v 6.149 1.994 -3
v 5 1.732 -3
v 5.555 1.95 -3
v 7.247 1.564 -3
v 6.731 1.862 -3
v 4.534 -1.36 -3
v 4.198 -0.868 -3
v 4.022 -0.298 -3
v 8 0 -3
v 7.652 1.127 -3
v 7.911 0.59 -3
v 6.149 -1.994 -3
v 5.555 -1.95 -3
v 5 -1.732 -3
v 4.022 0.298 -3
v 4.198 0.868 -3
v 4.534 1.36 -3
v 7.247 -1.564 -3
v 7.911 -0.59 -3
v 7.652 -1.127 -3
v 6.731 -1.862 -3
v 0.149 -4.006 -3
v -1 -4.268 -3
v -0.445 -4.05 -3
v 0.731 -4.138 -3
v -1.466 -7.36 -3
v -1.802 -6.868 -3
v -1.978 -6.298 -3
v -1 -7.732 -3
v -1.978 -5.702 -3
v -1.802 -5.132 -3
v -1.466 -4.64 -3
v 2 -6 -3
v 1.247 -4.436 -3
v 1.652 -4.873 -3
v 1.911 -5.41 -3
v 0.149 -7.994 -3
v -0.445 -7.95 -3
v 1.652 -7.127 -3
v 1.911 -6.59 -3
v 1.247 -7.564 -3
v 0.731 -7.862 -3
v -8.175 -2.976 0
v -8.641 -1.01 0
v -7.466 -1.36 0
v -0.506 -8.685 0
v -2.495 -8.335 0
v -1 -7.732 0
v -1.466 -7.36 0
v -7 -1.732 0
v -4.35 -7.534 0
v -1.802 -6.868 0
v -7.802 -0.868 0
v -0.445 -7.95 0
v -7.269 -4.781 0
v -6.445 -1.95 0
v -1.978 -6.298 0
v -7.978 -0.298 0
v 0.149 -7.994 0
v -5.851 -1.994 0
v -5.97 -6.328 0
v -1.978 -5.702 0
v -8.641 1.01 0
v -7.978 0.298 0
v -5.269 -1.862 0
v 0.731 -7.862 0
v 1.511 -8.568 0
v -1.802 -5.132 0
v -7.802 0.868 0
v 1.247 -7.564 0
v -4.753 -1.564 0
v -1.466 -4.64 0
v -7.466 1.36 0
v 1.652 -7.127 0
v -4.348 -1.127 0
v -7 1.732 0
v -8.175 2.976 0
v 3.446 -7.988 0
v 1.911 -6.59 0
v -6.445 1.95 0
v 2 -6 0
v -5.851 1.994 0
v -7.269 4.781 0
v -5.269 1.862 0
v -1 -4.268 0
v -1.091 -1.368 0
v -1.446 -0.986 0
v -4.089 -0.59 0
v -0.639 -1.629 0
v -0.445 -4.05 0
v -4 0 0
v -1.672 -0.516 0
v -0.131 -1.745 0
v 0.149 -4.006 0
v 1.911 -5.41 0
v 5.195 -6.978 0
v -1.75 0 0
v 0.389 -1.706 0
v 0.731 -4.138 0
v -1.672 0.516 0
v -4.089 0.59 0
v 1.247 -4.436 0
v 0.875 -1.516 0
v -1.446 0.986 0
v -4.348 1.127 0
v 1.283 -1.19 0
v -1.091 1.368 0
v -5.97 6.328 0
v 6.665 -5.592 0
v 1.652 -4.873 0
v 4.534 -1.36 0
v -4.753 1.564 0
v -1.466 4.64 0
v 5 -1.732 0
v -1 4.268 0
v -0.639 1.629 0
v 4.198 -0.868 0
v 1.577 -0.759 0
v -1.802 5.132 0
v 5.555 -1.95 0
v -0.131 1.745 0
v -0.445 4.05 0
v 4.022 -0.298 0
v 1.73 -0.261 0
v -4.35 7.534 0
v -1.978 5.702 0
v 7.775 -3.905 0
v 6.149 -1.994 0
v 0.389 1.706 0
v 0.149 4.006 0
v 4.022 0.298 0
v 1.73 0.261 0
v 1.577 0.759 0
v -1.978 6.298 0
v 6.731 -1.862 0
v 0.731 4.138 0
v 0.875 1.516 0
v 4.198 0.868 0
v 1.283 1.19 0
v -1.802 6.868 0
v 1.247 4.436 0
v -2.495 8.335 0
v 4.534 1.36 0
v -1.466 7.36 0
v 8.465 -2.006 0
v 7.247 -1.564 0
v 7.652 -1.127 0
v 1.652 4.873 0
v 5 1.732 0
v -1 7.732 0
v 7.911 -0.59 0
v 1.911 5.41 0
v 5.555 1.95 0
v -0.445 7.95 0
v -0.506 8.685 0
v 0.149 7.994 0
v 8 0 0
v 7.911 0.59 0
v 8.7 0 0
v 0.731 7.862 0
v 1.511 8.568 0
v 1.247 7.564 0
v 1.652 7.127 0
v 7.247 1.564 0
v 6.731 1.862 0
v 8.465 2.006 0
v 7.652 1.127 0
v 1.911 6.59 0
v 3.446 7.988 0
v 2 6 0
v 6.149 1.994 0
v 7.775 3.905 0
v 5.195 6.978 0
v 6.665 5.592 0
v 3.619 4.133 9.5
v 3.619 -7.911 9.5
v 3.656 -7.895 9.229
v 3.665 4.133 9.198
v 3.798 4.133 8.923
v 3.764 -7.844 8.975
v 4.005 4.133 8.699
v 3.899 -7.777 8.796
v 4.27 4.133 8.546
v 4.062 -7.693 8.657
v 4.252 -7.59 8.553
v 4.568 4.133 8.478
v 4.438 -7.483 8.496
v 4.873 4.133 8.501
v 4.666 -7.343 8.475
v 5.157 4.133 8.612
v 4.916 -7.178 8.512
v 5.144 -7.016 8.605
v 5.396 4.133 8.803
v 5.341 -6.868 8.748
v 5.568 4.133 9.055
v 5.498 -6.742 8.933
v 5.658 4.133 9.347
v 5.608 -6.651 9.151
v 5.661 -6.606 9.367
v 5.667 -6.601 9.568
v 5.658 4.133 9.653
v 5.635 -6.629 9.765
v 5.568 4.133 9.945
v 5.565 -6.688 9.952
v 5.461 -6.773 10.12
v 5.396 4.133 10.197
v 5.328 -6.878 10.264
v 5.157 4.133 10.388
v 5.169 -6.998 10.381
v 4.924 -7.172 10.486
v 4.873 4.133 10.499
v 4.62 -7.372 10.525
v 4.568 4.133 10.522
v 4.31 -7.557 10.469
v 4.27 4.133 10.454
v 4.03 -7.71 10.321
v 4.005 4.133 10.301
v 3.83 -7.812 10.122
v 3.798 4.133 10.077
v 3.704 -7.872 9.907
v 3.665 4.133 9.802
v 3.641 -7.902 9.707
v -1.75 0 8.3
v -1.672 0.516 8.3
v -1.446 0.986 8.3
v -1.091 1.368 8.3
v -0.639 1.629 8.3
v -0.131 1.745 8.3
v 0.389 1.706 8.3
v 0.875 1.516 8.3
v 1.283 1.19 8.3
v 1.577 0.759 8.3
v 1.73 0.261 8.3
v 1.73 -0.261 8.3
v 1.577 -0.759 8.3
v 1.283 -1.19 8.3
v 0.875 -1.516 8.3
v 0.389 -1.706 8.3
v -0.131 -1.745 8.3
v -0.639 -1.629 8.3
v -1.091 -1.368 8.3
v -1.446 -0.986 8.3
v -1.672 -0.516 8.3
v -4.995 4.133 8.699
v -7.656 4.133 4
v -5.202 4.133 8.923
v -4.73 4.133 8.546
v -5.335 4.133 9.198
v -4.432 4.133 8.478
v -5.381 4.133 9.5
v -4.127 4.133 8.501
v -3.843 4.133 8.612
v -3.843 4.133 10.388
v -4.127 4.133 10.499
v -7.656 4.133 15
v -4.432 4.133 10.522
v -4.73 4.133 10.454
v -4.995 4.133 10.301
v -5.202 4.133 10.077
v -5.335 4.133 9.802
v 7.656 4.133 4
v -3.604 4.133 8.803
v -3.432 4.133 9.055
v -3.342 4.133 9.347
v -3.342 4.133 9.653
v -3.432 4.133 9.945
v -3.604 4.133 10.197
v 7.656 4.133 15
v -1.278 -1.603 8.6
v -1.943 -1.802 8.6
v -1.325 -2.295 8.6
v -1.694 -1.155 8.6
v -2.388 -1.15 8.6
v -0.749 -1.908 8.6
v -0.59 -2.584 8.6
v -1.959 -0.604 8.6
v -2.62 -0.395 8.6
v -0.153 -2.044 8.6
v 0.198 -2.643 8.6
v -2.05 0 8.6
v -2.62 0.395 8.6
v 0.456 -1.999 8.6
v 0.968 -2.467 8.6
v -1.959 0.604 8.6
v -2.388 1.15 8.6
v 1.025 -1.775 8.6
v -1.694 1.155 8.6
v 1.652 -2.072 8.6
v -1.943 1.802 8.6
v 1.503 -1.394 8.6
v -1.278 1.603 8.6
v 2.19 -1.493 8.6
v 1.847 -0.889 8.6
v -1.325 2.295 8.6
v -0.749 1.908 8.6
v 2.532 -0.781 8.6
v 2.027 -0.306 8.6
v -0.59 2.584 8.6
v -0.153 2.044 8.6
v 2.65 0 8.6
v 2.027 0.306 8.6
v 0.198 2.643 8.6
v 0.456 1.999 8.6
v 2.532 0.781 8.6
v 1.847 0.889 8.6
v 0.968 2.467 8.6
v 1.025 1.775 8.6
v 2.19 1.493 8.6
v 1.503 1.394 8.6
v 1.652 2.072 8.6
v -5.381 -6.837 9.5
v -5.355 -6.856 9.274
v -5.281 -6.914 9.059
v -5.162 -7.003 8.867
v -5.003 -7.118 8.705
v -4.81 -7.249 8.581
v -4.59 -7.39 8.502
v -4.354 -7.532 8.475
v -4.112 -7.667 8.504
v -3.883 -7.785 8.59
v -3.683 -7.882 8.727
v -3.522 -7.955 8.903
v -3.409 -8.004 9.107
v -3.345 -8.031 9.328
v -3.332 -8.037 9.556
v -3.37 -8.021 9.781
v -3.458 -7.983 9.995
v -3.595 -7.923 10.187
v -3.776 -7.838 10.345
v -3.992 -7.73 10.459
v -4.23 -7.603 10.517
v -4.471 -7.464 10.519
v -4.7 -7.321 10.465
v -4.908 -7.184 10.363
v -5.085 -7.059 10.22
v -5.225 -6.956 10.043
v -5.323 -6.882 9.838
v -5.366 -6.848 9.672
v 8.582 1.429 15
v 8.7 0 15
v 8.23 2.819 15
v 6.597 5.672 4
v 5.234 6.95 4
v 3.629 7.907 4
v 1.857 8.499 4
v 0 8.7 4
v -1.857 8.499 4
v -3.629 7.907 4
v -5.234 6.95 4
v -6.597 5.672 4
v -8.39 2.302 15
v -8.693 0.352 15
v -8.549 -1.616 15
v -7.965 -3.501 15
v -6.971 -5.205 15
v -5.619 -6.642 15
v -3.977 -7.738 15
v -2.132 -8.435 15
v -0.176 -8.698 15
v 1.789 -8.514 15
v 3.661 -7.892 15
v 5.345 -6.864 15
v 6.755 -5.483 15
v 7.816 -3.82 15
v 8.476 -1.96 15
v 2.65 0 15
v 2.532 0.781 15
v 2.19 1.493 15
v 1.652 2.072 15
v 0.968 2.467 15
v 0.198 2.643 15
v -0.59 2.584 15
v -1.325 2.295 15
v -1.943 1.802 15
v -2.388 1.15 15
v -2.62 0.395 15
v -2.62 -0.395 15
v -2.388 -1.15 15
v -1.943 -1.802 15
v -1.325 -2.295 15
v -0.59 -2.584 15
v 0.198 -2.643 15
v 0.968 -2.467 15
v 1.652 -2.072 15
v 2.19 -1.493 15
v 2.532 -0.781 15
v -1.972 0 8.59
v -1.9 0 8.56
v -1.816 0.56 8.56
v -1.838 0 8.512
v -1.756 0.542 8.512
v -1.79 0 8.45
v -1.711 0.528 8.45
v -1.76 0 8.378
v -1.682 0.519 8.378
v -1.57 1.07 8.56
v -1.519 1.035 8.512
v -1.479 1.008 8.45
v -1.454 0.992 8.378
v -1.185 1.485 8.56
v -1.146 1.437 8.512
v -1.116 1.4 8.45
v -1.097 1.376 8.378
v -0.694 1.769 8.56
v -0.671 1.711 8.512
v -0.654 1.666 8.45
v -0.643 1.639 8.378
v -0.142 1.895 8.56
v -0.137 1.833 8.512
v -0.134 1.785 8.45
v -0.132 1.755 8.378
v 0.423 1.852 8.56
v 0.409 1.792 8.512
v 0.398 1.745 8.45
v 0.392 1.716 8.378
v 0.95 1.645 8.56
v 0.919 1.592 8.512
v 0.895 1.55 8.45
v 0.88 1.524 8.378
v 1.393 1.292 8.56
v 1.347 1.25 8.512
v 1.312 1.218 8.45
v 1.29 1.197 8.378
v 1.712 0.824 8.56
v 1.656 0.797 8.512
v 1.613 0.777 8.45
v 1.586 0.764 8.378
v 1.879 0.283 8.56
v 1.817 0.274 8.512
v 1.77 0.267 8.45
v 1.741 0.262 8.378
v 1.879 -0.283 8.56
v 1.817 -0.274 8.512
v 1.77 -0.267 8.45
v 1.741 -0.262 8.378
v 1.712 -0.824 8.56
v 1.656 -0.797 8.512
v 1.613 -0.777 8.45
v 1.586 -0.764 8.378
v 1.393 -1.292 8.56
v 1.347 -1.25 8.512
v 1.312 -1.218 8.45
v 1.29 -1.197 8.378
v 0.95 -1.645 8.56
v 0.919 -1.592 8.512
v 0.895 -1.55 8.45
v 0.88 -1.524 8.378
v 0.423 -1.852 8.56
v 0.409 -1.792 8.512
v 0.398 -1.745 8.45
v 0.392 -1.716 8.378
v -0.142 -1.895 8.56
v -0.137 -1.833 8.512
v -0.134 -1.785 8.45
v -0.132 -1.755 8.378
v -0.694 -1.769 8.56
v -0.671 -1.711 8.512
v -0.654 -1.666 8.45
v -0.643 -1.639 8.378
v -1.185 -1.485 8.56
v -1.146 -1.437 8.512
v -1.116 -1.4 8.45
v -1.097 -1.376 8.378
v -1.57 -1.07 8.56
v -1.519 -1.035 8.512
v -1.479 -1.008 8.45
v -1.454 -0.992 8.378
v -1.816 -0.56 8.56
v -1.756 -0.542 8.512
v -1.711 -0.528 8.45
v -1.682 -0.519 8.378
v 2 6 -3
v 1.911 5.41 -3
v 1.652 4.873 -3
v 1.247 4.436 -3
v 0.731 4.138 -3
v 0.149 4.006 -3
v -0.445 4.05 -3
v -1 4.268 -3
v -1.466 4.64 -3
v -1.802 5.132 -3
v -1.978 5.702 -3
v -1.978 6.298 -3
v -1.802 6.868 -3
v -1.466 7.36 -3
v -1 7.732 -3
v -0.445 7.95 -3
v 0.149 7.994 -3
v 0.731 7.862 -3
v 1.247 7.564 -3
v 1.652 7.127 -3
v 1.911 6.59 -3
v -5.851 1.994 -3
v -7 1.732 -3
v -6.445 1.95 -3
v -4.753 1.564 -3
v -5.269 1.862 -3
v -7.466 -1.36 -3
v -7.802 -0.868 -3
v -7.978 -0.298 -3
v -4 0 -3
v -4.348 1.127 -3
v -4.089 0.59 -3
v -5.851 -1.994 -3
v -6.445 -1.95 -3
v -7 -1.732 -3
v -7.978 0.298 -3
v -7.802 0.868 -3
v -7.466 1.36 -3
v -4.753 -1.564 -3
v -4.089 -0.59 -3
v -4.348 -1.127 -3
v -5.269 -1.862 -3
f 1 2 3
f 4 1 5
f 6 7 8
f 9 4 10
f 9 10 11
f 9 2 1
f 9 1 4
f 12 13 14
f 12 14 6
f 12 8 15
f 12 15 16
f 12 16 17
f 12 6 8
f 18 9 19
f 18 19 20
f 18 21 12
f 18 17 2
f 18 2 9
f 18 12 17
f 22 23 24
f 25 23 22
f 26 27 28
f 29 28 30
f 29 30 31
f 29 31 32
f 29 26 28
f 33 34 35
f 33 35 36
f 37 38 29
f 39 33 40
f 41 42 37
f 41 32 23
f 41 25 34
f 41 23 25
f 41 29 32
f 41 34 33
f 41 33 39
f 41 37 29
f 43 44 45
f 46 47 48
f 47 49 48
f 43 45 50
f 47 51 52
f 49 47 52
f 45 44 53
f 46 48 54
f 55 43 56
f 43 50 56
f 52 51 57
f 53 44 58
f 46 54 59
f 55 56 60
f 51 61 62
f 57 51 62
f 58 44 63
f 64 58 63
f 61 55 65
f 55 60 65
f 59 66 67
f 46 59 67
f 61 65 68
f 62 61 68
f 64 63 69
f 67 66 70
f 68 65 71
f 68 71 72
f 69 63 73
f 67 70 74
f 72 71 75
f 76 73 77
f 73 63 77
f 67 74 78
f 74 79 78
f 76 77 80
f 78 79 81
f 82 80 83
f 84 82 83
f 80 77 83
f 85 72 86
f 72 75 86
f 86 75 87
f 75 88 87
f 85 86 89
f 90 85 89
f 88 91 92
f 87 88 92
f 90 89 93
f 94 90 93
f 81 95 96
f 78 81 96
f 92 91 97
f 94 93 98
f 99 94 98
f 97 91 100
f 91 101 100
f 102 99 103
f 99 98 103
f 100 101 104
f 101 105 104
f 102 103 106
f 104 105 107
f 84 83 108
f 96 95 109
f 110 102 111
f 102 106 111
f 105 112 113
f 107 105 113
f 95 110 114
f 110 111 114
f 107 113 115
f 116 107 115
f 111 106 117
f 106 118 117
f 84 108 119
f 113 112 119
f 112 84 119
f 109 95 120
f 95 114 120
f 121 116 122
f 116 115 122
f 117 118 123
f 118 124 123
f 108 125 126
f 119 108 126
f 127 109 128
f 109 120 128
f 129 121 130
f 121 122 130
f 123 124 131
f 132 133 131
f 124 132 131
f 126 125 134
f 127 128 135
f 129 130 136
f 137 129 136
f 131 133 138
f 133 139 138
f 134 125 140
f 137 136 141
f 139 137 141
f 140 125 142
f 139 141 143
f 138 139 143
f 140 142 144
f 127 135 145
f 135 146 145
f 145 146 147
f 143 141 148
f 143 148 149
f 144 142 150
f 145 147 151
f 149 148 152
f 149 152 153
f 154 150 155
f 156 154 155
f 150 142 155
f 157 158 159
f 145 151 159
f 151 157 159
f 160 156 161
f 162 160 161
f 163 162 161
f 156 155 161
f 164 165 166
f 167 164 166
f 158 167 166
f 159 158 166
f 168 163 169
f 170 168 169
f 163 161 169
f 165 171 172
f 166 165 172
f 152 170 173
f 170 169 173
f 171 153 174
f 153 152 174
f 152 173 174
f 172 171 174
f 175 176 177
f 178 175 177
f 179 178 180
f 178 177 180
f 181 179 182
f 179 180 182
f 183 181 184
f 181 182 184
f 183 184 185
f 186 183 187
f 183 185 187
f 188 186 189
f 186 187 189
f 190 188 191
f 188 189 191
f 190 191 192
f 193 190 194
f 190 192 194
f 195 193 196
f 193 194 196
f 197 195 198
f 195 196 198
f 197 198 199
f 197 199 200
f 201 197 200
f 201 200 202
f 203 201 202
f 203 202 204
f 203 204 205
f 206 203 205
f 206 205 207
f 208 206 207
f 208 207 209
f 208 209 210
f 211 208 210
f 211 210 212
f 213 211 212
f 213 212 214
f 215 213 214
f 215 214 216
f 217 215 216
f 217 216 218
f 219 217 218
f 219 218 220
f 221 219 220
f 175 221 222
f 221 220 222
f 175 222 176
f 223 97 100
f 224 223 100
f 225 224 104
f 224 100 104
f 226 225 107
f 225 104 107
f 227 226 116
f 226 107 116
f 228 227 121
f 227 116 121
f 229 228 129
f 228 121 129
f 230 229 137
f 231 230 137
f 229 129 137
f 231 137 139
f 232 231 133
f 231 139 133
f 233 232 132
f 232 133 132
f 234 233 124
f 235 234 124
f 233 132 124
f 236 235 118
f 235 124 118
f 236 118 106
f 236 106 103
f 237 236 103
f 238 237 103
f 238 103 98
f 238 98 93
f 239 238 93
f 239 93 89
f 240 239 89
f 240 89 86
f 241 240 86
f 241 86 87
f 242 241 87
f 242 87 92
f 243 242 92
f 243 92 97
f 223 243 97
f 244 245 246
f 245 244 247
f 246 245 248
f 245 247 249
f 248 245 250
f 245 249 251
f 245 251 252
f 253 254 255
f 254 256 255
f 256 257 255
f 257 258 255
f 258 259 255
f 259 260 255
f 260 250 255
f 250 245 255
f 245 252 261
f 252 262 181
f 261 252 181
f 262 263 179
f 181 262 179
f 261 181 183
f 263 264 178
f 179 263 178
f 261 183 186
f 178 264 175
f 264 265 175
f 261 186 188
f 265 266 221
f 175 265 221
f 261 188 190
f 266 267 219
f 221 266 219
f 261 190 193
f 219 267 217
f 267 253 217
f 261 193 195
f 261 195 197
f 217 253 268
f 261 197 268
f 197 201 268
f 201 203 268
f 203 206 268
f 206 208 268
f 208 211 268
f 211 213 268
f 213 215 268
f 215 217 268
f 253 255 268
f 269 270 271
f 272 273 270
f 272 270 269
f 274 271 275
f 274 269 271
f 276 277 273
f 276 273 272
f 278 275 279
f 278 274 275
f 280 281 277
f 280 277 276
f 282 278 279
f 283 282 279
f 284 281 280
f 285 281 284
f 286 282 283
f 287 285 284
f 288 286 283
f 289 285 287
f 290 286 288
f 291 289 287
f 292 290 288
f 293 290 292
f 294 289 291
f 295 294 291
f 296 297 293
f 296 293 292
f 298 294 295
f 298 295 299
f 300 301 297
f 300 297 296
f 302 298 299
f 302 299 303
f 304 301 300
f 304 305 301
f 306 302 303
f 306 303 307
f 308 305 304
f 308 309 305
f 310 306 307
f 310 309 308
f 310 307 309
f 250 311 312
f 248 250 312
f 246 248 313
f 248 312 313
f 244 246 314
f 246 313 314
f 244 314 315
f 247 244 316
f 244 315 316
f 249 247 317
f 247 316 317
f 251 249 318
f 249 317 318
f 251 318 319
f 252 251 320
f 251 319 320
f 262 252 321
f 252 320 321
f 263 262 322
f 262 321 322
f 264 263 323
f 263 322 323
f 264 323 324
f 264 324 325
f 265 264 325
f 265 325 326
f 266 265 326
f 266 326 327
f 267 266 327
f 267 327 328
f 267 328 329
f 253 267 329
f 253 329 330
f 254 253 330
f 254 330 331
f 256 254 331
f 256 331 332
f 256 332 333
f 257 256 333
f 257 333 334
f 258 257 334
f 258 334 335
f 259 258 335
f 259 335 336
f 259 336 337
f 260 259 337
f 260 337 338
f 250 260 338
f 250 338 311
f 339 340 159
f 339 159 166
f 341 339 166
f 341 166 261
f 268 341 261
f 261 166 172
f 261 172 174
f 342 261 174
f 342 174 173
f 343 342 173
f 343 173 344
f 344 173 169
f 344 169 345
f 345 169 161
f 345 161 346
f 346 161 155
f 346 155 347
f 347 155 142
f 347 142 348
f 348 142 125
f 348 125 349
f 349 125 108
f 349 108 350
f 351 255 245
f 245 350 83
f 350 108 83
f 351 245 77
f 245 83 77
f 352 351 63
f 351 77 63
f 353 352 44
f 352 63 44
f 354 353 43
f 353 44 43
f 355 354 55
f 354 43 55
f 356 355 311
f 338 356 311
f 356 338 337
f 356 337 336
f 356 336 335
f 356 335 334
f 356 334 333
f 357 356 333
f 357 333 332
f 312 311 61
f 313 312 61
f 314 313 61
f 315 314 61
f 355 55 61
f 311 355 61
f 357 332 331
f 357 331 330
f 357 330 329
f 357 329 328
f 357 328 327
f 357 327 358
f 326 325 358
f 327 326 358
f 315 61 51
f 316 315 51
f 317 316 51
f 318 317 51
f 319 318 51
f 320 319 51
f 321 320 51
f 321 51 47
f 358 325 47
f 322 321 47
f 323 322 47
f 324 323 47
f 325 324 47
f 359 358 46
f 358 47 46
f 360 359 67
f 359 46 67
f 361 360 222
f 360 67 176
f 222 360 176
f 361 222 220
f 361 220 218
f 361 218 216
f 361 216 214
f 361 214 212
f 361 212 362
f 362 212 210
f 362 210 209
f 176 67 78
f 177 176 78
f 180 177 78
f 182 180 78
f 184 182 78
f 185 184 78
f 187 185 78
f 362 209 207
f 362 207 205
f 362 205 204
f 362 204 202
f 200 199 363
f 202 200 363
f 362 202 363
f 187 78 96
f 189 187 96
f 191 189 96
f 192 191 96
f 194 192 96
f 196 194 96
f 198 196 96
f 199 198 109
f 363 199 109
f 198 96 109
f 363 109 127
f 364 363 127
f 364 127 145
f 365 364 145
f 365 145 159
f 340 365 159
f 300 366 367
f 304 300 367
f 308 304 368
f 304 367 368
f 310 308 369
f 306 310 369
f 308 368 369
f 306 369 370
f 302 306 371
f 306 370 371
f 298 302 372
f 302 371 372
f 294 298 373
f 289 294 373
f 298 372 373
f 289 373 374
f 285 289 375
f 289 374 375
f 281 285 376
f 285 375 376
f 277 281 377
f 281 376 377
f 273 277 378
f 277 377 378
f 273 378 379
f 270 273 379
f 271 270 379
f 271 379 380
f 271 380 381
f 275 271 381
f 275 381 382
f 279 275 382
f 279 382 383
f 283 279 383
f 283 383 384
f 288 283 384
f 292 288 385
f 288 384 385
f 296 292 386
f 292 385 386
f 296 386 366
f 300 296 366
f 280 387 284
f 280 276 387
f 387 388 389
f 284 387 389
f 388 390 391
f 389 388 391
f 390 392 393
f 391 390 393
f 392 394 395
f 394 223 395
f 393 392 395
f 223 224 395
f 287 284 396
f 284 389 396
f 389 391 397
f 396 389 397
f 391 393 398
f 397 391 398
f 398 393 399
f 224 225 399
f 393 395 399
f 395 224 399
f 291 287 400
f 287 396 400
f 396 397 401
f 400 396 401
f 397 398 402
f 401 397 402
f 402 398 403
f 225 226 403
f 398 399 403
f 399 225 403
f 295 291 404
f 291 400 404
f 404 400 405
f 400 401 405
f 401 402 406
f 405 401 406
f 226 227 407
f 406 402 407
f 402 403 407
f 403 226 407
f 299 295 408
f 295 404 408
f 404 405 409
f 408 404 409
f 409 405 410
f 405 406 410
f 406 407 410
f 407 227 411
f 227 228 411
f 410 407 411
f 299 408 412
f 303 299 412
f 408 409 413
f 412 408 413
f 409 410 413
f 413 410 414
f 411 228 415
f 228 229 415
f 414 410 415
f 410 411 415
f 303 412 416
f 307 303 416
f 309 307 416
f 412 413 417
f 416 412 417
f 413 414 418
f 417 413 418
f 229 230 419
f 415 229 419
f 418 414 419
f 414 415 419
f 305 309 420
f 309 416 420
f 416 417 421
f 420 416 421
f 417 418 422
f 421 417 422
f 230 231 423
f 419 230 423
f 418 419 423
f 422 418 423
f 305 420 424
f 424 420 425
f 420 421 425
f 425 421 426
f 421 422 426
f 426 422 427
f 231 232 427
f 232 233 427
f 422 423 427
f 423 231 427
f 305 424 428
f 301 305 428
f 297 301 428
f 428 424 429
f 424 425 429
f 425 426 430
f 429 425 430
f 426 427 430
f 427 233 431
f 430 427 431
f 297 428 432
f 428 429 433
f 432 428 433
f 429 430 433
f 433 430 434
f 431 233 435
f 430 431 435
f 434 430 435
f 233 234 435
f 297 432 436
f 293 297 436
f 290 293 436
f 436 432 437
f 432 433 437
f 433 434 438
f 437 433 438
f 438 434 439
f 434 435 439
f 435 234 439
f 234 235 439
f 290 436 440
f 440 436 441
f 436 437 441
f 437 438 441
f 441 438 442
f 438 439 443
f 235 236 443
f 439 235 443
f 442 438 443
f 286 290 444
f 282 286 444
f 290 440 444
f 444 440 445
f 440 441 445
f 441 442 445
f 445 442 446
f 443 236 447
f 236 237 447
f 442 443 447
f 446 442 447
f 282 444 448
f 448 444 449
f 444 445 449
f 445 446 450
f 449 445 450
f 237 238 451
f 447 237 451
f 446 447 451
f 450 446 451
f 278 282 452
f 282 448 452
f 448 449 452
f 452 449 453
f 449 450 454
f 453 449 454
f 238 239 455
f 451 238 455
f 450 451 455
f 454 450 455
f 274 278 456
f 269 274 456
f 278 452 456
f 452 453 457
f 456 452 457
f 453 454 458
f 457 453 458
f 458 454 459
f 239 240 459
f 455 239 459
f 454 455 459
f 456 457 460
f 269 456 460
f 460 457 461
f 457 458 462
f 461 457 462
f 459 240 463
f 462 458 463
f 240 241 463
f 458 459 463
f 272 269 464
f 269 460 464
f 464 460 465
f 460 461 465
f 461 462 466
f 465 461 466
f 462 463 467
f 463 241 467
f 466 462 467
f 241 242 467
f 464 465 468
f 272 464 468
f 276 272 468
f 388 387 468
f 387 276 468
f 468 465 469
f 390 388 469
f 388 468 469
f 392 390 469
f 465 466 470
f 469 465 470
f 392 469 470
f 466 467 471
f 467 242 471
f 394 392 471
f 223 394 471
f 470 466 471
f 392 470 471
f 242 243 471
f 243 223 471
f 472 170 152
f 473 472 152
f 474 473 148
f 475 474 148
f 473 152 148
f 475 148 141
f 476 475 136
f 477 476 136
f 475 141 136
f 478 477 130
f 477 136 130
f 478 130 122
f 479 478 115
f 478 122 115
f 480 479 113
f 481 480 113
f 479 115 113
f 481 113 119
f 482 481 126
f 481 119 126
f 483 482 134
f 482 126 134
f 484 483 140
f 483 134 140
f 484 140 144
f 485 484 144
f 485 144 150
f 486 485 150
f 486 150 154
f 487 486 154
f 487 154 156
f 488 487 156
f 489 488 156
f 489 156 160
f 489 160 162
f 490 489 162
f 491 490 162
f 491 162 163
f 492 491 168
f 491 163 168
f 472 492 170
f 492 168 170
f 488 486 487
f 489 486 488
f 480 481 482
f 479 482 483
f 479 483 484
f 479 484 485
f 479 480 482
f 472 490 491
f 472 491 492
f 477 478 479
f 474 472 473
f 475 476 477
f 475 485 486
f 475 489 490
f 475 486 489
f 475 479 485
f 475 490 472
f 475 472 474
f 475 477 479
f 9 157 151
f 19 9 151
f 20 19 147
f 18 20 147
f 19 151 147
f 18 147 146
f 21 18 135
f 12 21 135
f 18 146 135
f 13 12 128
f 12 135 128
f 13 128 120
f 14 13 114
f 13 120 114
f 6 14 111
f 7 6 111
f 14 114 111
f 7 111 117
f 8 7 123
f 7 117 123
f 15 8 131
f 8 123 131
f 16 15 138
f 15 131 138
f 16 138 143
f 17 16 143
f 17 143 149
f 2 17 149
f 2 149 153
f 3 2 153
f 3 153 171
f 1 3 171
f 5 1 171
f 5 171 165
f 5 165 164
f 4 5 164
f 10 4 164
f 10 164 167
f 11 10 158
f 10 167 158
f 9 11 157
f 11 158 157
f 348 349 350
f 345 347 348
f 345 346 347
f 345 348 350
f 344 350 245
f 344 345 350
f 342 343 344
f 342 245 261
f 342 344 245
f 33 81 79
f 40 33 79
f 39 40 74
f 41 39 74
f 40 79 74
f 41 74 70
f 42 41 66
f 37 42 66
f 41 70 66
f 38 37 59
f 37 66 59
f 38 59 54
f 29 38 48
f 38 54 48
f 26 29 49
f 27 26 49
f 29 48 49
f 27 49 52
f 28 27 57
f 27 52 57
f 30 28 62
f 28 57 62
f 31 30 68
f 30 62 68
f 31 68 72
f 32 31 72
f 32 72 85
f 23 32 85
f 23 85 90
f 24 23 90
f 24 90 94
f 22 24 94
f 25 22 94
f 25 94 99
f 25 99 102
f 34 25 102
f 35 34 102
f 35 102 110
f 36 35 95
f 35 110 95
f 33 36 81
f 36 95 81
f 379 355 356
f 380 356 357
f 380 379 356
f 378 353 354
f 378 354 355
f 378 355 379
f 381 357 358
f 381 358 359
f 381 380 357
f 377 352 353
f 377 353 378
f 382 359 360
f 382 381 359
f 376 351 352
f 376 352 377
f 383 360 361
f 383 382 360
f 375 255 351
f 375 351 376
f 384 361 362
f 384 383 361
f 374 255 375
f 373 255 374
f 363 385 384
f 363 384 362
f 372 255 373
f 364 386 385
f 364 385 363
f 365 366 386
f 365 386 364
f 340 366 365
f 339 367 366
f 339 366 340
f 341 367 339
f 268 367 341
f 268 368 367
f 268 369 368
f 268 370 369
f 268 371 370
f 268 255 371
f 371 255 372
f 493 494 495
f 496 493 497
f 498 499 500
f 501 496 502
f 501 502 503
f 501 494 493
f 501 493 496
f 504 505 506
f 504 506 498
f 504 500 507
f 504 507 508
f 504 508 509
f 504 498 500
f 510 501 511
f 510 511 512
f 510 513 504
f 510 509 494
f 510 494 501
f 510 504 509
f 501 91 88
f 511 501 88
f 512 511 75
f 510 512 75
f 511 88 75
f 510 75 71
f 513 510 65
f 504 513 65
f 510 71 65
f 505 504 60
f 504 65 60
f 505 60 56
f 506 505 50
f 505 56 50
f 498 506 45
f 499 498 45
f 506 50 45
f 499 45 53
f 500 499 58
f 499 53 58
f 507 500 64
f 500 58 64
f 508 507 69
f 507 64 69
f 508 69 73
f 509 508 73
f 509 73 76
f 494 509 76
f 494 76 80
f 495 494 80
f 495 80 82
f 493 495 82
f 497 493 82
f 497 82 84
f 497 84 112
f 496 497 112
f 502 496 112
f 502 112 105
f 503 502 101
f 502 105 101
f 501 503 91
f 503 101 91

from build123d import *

# Parameters (mm, degrees)
SKETCH1_R                      = 8.7
BOSS_EXTRUDE1_DEPTH            = 15
SKETCH5_R                      = 1.75
CUT_EXTRUDE1_DEPTH             = 20.400515457
SKETCH6_R                      = 2.65
CUT_EXTRUDE3_DEPTH             = 6.4
SKETCH2_W                      = 17
SKETCH2_H                      = 4.566888769
CUT_EXTRUDE4_DEPTH             = 11
FILLET1_R                      = 0.3
TAP_DRILL_FOR_M2_5X0_45_TAP2_D = 2.05
SKETCH4_R                      = 2
BOSS_EXTRUDE2_DEPTH            = 3


with BuildPart() as part:
    # Sketch1 → Boss-Extrude1 (new body)
    with BuildSketch(Plane.XY):
        Circle(SKETCH1_R)
    extrude(amount=BOSS_EXTRUDE1_DEPTH)

    # Sketch5 → Cut-Extrude1 (cut, through all)
    with BuildSketch(Plane(origin=(0, 0, 0), x_dir=(-1, 0, 0), z_dir=(0, 0, -1))):
        Circle(SKETCH5_R)
    extrude(amount=-CUT_EXTRUDE1_DEPTH, mode=Mode.SUBTRACT)

    # Sketch6 → Cut-Extrude3 (cut)
    with BuildSketch(Plane.XY.offset(15)):
        Circle(SKETCH6_R)
    extrude(amount=-CUT_EXTRUDE3_DEPTH, mode=Mode.SUBTRACT)

    # Sketch2 → Cut-Extrude4 (cut)
    with BuildSketch(Plane.XY.offset(15)):
        with Locations((0.844453543, 6.416555616)):
            Rectangle(SKETCH2_W, SKETCH2_H)
    extrude(amount=-CUT_EXTRUDE4_DEPTH, mode=Mode.SUBTRACT)

    # Fillet1
    fillet1_edges = [part.edges().sort_by_distance(p)[0] for p in [
        (1.75, 0, 8.6),
    ]]
    fillet(fillet1_edges, radius=FILLET1_R)

    # Tap Drill for M2.5x0.45 Tap2 (through all)
    with Locations(Plane(origin=(0, 4.133111231, 0), x_dir=(1, 0, 0), z_dir=(0, 1, 0))):
        with Locations((-4.355546457, -9.5), (4.644453543, -9.5)):
            Hole(TAP_DRILL_FOR_M2_5X0_45_TAP2_D / 2)

    # Sketch4 → Boss-Extrude2 (add)
    with BuildSketch(Plane(origin=(0, 0, 0), x_dir=(-1, 0, 0), z_dir=(0, 0, -1))):
        with Locations(Location((0, 6, 0), (0, 0, 180))):
            Circle(SKETCH4_R)
        with Locations(Location((6, 0, 0), (0, 0, 180))):
            Circle(SKETCH4_R)
        with Locations(Location((0, -6, 0), (0, 0, 180))):
            Circle(SKETCH4_R)
        with Locations(Location((-6, 0, 0), (0, 0, 180))):
            Circle(SKETCH4_R)
    extrude(amount=BOSS_EXTRUDE2_DEPTH)


solid = part.part
